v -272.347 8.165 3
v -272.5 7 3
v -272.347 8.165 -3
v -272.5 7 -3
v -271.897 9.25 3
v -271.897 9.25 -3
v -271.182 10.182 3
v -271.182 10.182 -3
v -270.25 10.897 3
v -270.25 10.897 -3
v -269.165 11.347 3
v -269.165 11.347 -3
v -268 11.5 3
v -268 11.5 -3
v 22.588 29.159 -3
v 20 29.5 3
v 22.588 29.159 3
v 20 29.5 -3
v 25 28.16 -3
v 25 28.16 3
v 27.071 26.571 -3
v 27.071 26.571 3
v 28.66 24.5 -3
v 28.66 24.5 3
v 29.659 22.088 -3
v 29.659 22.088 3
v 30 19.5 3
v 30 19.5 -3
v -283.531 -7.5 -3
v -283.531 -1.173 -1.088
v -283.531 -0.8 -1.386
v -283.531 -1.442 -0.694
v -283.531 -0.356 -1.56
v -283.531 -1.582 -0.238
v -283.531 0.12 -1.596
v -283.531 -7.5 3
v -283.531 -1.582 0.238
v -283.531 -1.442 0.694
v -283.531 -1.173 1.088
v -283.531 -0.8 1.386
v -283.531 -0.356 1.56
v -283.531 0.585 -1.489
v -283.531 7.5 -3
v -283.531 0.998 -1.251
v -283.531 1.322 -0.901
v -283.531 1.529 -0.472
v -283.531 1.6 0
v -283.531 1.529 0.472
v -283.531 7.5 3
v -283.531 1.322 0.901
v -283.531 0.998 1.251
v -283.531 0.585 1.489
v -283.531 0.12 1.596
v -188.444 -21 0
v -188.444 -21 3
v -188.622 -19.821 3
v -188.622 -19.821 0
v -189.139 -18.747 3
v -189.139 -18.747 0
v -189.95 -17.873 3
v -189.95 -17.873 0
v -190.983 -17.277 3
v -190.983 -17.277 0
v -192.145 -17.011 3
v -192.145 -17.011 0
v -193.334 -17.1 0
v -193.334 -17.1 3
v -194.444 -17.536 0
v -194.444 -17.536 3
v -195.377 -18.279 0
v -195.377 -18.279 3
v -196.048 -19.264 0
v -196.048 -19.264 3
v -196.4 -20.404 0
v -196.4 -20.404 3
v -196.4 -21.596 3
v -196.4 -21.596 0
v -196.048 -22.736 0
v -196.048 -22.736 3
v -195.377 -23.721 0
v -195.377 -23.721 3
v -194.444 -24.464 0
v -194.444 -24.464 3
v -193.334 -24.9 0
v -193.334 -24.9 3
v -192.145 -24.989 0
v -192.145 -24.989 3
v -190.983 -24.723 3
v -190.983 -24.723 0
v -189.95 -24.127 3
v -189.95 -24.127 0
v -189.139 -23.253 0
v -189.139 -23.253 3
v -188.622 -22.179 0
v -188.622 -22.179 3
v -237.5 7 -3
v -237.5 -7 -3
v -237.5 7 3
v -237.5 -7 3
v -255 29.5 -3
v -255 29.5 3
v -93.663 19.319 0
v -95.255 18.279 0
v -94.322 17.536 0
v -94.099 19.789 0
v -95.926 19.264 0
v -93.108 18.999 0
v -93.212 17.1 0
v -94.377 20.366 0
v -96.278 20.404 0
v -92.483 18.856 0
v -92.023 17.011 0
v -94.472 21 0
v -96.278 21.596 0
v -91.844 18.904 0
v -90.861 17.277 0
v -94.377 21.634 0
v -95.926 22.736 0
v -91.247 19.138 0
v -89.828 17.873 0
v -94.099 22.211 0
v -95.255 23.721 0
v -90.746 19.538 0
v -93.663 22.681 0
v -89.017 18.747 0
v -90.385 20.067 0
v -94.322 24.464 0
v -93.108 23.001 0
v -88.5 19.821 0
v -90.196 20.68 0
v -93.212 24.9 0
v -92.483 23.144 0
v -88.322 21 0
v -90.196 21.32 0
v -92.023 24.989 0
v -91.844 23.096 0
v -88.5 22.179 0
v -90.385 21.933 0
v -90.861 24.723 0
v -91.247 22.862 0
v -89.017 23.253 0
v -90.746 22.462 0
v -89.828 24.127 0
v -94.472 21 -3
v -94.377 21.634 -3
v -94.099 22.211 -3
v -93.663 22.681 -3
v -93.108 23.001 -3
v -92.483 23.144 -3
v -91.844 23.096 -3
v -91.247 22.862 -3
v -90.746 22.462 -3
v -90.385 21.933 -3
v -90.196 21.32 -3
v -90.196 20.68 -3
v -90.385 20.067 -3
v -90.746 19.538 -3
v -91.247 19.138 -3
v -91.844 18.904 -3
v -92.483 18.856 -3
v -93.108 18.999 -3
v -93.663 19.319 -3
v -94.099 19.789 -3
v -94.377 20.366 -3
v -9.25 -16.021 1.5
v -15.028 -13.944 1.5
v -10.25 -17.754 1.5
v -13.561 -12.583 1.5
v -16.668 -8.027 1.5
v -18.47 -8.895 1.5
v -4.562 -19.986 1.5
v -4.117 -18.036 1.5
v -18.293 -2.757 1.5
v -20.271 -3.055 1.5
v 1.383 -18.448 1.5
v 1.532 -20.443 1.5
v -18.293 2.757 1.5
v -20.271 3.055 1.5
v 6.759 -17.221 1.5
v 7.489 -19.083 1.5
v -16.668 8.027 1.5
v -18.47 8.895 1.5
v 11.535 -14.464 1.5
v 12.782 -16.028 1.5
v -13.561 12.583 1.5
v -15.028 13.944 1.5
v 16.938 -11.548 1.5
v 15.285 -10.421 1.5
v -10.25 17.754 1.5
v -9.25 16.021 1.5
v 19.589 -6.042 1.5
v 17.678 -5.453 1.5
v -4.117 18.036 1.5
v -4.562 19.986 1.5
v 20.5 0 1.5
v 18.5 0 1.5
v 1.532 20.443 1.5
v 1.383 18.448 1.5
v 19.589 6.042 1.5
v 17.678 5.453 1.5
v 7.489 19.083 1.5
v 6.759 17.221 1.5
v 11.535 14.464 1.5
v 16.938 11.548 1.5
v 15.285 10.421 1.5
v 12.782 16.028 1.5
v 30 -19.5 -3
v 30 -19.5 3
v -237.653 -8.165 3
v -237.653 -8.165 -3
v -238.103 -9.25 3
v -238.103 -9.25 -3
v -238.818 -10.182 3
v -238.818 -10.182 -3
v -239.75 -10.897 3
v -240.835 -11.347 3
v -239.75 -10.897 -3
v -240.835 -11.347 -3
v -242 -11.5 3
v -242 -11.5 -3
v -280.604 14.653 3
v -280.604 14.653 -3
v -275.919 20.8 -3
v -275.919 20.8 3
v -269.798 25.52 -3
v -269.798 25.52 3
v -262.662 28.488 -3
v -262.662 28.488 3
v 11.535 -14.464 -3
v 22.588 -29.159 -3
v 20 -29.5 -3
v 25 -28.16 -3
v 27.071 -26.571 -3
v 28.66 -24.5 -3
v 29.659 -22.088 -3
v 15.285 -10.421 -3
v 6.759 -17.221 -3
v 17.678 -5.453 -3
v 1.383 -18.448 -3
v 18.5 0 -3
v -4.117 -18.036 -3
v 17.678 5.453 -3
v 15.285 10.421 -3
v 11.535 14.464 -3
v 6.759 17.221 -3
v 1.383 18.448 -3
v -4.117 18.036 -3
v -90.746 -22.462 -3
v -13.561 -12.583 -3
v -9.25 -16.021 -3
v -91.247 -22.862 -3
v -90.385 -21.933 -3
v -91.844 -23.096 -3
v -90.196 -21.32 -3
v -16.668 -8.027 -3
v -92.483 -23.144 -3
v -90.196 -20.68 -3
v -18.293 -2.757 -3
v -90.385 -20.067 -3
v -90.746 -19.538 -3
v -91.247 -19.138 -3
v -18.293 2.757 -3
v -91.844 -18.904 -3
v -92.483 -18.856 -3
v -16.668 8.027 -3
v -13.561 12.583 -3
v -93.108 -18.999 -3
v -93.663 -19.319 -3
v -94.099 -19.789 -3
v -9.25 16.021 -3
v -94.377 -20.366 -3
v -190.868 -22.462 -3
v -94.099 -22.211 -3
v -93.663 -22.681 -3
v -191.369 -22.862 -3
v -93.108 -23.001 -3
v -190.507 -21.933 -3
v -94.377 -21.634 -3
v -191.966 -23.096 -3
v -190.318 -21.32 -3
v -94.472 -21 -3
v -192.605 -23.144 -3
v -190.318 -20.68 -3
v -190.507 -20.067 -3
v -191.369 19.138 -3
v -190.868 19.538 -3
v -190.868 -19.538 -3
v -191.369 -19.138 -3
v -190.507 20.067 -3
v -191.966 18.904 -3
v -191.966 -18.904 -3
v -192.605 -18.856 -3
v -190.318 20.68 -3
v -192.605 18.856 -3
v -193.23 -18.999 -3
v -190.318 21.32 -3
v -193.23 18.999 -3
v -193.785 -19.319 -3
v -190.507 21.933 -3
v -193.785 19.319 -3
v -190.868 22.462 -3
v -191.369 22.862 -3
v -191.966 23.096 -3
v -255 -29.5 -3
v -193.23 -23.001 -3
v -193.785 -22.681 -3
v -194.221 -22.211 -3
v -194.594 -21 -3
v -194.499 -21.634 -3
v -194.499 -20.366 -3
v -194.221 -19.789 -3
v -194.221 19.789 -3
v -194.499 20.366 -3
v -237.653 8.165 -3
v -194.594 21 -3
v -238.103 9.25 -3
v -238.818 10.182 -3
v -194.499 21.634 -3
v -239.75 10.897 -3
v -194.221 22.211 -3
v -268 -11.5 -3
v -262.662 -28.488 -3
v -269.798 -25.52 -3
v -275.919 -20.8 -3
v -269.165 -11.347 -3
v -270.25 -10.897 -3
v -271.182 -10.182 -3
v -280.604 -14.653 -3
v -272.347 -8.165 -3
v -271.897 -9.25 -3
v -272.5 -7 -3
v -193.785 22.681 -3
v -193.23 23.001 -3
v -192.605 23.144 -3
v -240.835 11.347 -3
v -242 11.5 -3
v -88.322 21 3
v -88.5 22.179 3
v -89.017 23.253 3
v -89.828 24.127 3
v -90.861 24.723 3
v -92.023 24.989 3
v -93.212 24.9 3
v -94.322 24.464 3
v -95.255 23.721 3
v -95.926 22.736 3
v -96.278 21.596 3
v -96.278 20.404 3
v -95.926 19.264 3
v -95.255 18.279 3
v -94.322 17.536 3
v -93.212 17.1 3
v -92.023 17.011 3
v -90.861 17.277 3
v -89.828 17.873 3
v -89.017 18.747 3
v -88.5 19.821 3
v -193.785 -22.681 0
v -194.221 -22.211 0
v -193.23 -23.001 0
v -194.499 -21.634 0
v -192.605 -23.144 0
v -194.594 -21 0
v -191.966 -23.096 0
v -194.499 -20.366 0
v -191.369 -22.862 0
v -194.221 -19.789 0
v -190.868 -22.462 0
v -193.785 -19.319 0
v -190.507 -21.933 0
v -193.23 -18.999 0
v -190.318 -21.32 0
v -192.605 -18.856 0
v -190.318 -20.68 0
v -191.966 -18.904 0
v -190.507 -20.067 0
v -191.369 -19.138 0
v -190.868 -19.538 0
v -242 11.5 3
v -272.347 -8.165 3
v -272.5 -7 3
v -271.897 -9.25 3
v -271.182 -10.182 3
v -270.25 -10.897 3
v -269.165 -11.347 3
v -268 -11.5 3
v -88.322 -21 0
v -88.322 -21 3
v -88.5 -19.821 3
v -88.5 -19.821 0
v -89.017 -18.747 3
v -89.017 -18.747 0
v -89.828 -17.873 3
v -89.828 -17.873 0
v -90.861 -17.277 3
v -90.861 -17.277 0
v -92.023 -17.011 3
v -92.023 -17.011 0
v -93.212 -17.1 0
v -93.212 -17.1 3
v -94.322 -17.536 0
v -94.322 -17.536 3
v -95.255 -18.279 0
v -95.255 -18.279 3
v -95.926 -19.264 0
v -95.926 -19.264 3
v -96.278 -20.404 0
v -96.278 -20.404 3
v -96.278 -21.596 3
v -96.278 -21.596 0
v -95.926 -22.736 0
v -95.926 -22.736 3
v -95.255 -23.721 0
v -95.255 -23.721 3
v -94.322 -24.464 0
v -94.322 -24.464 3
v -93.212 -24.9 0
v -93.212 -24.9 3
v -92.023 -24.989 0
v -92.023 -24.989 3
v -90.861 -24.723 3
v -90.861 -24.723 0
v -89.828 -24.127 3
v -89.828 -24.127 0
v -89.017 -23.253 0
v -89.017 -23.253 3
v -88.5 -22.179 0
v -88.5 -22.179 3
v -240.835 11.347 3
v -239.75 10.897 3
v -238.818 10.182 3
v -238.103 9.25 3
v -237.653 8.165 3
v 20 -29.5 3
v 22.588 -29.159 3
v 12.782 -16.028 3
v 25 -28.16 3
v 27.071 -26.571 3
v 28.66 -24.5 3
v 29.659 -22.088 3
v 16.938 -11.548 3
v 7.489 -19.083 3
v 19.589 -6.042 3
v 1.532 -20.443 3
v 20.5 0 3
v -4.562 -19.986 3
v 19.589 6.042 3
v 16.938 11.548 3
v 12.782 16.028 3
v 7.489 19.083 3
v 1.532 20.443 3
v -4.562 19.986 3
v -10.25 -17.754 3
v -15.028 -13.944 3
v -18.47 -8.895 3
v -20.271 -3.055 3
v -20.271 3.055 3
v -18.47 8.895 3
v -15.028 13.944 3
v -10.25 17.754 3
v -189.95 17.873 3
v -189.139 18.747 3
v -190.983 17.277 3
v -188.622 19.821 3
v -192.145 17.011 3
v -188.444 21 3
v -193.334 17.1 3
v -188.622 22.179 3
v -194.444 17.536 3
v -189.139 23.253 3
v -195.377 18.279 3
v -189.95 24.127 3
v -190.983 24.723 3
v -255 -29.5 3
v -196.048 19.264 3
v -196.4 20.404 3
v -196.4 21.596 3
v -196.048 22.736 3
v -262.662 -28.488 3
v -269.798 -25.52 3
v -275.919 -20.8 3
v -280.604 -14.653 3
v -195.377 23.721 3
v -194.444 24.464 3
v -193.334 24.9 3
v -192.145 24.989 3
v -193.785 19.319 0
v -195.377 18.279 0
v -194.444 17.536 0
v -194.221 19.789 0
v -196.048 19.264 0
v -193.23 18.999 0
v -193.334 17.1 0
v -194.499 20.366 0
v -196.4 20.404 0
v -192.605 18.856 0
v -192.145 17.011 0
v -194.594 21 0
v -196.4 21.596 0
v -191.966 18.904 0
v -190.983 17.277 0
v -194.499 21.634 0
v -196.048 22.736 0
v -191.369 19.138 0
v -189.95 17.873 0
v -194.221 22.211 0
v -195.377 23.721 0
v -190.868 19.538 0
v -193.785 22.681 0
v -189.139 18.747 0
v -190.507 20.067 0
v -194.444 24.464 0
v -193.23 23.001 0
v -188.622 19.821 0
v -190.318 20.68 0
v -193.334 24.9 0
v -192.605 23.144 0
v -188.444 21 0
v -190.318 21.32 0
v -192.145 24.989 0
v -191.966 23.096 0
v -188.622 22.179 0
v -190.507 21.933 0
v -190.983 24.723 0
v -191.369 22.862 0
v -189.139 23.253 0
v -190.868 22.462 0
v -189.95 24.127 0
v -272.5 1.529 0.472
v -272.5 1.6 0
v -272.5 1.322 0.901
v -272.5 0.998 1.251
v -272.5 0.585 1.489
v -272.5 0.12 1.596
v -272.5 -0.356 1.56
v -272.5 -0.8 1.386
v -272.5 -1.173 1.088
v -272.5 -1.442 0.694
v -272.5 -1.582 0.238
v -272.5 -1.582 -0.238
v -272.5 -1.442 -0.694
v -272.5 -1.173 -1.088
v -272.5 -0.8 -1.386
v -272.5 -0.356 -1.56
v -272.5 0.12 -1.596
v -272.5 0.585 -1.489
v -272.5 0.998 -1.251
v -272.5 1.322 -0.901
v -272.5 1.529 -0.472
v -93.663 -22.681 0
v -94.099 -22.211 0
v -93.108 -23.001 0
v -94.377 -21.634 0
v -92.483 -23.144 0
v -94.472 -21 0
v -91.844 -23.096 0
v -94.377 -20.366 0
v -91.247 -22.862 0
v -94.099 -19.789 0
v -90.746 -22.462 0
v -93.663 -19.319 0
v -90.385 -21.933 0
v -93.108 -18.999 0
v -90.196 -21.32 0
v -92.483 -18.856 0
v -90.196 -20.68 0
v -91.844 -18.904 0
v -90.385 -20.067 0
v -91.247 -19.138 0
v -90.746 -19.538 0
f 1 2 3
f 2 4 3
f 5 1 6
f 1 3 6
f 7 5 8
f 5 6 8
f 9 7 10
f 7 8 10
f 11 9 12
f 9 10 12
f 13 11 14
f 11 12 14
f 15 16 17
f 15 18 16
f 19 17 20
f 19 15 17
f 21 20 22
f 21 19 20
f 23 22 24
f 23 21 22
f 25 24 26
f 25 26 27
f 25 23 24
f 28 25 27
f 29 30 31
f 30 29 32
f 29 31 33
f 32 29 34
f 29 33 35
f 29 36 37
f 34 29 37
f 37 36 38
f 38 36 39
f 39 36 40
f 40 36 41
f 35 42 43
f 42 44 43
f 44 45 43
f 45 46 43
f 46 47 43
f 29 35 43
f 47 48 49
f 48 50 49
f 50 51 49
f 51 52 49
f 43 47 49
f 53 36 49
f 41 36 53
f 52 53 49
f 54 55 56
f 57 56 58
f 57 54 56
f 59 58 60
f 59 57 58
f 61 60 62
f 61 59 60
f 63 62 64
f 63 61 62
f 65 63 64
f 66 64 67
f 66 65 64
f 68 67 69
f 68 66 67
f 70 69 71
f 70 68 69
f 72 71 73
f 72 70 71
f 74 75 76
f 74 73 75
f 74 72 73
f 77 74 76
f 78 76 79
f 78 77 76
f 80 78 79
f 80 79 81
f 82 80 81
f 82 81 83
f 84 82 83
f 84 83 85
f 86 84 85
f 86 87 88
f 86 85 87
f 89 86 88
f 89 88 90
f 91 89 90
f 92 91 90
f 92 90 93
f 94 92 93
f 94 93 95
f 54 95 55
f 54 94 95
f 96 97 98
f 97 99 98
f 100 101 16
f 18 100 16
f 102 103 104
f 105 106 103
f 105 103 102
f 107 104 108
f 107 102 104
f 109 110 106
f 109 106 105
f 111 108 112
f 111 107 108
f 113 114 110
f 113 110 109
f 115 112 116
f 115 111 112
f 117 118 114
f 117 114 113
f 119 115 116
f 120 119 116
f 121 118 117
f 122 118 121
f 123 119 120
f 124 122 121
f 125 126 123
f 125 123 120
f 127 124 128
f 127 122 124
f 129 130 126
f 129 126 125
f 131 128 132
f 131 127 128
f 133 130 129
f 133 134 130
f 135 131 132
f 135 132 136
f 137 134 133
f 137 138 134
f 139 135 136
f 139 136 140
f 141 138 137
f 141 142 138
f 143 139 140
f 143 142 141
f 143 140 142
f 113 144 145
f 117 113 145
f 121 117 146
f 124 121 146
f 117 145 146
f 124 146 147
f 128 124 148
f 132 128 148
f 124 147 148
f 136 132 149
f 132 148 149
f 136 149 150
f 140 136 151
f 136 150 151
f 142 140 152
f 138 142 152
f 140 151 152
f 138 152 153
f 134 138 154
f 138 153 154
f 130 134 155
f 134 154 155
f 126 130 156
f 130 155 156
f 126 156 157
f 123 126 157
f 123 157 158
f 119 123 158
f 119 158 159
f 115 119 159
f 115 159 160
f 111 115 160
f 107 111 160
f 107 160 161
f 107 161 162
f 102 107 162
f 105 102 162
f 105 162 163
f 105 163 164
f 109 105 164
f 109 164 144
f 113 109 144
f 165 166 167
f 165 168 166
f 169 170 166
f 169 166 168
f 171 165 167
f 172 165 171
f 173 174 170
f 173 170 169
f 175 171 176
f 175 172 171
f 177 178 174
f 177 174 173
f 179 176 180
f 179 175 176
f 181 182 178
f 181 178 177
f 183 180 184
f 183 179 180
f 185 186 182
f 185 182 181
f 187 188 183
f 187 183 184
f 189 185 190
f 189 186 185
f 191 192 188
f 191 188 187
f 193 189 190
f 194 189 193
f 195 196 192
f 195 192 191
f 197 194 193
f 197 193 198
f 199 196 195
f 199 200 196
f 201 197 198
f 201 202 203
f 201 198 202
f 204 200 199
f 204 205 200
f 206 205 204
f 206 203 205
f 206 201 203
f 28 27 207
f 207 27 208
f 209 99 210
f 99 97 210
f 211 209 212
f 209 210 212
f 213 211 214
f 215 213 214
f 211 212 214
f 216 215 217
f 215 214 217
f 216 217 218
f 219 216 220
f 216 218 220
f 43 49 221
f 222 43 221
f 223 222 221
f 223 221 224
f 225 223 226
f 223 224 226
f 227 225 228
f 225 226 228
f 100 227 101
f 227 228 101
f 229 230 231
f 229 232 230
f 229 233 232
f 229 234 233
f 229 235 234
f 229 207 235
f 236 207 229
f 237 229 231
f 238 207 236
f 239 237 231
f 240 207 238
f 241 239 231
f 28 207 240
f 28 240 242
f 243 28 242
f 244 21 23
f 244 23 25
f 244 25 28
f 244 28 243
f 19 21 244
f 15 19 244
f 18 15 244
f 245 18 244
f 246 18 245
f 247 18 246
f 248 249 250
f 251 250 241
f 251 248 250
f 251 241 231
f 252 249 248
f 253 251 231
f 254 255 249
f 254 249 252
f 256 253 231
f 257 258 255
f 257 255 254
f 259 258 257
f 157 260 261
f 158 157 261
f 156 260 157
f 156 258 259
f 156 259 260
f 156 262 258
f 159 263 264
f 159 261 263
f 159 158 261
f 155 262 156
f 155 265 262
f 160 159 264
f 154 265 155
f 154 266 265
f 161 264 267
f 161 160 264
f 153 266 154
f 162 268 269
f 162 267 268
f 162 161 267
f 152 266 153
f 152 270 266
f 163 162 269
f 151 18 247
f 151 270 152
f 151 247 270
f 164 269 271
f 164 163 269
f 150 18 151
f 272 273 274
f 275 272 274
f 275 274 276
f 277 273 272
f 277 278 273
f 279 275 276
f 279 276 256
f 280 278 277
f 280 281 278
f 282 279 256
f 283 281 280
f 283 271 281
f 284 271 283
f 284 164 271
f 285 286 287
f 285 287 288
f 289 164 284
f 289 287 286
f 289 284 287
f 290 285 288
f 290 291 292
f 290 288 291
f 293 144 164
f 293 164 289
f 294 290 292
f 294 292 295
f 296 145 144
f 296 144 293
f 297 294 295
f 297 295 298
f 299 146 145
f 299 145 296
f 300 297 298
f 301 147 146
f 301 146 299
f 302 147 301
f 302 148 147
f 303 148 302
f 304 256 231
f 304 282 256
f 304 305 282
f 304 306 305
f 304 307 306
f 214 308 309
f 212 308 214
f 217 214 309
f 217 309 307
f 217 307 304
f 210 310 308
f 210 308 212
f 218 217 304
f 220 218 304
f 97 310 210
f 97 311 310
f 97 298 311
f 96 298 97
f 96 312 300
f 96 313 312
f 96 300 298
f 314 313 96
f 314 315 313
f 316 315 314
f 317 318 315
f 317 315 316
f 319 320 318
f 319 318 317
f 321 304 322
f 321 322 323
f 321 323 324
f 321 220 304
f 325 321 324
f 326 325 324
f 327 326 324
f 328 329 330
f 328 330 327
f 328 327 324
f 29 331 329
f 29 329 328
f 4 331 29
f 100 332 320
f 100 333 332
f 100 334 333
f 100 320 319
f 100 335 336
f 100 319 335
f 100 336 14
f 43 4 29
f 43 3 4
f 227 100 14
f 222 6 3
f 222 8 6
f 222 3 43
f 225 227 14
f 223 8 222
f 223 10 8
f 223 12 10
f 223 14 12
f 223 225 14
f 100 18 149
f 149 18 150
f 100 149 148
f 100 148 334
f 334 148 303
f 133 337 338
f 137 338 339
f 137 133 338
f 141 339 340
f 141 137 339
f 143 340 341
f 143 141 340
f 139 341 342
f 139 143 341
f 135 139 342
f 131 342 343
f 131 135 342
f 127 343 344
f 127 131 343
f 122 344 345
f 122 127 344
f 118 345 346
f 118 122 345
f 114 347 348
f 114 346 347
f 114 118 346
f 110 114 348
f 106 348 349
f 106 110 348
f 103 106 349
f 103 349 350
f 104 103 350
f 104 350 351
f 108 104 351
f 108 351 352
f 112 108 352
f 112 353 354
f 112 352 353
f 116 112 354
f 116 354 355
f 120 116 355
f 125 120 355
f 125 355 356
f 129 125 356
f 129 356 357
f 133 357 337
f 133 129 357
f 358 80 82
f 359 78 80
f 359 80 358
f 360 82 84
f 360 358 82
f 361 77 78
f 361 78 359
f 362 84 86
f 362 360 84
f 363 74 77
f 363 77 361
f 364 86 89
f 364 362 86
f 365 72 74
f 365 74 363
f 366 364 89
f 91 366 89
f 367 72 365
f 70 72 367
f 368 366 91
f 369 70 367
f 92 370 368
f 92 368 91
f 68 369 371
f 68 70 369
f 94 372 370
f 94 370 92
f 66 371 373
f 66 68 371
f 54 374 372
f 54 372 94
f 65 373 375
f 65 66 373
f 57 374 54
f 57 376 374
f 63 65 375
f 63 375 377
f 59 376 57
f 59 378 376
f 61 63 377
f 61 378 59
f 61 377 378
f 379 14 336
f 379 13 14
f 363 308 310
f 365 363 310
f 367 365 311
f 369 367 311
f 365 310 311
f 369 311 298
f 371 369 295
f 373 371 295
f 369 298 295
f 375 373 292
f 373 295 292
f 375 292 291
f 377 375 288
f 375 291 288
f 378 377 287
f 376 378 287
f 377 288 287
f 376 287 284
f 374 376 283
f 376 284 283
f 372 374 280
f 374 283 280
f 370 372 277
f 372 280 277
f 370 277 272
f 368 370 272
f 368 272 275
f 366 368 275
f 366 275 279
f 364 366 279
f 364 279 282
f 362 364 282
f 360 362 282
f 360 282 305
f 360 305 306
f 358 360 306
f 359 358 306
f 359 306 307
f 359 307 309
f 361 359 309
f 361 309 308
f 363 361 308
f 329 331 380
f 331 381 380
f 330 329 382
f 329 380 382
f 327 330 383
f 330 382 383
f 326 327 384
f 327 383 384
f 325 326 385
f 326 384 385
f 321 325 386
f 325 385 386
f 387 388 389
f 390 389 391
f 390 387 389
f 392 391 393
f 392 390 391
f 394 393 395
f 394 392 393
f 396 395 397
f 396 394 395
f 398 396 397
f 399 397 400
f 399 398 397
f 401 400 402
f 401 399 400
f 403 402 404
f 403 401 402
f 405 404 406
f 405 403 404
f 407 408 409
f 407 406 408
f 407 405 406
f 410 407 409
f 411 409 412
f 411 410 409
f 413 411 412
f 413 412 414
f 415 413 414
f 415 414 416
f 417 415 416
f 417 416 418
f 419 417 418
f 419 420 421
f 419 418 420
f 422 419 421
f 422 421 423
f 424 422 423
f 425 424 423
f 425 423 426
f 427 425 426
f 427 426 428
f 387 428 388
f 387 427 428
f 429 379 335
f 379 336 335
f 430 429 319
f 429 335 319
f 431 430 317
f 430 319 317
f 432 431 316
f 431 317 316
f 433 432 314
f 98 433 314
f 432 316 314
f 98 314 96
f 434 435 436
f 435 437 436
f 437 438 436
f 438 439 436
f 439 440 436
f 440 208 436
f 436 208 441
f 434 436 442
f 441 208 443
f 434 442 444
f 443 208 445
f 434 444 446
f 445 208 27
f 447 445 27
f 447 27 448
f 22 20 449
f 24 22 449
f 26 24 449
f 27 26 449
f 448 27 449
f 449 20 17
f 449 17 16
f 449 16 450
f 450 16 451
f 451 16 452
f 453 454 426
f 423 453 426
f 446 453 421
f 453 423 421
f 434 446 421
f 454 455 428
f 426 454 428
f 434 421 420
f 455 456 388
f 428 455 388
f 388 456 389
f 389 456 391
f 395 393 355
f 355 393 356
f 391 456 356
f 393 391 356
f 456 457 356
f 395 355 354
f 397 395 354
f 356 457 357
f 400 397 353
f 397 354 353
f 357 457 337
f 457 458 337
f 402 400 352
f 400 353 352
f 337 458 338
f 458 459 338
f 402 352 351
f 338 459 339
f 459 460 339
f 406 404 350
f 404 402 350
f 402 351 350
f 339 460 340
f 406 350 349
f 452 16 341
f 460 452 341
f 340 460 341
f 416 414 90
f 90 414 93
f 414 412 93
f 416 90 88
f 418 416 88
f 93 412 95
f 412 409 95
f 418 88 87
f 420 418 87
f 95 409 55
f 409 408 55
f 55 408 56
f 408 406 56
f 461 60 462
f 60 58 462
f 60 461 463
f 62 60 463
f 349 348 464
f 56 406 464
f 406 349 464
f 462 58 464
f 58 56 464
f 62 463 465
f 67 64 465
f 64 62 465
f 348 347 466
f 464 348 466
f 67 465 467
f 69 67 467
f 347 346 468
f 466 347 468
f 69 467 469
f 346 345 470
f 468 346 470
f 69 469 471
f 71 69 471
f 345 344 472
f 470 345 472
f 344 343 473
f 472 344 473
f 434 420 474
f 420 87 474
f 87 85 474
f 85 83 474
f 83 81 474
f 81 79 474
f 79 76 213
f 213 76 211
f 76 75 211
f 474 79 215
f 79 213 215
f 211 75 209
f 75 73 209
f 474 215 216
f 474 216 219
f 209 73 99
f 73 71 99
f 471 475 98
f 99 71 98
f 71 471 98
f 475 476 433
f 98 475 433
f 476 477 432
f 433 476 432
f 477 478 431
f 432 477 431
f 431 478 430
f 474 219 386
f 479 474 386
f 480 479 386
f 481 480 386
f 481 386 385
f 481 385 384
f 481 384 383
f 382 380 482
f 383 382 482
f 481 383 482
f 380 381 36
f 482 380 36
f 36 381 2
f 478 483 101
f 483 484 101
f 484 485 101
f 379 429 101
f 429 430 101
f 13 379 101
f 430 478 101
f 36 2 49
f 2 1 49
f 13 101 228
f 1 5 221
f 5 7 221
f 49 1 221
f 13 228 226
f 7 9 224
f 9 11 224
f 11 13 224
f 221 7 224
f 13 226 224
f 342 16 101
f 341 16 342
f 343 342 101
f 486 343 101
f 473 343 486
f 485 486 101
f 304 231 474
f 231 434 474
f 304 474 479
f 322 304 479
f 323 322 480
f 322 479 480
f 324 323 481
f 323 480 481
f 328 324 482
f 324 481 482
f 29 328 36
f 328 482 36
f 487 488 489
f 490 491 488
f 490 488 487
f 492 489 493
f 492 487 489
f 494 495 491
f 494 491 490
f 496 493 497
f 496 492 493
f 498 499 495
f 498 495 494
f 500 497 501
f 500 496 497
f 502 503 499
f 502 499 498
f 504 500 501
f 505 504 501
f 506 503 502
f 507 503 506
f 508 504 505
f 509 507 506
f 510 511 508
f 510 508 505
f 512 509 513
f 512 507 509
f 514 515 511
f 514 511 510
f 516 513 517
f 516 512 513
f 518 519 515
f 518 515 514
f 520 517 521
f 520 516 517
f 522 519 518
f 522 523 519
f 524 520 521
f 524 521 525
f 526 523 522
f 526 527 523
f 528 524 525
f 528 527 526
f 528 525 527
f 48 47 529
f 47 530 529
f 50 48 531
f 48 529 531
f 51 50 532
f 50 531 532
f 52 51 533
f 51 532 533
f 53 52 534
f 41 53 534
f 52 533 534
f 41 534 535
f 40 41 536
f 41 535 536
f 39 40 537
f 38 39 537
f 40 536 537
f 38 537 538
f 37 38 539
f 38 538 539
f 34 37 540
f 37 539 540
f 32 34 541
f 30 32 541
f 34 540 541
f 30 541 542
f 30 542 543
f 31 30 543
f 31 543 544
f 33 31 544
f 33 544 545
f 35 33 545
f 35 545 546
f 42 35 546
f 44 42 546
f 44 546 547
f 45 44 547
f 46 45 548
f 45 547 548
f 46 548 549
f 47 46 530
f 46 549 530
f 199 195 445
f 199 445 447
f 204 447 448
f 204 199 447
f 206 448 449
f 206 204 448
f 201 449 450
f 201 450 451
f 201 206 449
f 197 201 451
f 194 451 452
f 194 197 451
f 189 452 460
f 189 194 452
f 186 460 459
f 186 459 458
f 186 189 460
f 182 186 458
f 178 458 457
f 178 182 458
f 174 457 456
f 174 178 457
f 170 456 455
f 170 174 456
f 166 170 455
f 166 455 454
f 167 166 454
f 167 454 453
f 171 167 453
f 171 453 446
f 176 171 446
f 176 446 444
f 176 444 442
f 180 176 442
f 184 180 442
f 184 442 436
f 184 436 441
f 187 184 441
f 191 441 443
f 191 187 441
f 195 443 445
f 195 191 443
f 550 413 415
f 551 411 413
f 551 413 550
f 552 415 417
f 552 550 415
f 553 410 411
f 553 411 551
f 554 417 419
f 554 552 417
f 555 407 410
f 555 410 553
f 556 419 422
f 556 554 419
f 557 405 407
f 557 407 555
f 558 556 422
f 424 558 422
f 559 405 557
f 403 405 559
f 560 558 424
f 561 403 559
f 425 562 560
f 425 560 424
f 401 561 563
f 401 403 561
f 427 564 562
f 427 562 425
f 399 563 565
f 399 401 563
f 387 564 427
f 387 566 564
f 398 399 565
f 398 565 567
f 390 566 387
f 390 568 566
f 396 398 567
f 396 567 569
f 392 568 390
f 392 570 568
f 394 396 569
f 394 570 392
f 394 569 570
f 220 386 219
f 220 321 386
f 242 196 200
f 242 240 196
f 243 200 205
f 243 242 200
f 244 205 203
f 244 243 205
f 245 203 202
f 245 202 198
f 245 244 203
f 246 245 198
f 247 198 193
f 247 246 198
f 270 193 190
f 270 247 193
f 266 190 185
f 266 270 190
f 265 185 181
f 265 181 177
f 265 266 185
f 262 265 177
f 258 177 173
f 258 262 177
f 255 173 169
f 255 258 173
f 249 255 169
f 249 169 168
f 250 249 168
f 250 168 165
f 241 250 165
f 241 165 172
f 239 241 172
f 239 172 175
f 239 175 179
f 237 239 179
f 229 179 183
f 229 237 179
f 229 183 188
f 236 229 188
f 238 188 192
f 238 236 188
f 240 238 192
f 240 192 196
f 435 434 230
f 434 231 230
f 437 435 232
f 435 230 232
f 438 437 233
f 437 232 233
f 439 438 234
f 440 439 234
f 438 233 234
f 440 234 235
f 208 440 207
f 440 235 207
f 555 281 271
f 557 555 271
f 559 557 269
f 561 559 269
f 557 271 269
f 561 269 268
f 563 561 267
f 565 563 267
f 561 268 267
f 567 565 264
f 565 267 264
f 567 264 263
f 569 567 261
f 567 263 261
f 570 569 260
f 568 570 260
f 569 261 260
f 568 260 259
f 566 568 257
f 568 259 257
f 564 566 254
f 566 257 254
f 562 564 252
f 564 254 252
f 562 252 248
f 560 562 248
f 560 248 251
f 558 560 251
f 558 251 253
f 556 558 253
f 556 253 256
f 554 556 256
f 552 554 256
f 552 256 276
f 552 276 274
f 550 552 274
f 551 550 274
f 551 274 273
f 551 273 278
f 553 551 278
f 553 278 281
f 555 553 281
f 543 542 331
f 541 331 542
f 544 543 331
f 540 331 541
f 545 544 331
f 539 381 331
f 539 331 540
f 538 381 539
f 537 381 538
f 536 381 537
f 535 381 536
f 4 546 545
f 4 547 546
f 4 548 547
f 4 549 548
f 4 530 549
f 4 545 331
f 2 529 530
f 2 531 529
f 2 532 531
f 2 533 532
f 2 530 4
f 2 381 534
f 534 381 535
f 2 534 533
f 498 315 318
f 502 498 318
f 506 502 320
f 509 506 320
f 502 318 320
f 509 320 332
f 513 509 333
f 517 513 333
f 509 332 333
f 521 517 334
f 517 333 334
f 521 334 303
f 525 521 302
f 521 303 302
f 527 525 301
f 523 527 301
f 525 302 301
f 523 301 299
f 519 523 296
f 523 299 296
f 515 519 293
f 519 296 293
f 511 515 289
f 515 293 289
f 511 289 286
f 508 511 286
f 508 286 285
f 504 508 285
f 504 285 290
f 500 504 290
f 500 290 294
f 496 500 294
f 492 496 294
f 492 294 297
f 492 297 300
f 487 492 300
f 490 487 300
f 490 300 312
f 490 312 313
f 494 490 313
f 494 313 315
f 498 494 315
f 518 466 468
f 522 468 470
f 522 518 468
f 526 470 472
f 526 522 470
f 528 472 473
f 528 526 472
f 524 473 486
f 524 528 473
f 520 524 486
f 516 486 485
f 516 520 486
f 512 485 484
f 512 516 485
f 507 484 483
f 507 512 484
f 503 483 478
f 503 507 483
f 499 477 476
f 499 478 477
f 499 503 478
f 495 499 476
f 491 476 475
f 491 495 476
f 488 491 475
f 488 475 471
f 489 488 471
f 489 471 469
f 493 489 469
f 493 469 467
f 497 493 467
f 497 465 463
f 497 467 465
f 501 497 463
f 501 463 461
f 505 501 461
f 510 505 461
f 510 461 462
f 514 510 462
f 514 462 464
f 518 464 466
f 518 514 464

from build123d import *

# Parameters (mm, degrees)
SKETCH_1_R             = 18.5
SKETCH_1_W             = 35
SKETCH_1_H             = 23
EXTRUDE_1_DEPTH        = 3
CUT_EXTRUDE_START      = 1.5
SKETCH_1_3_R           = 20.5
SKETCH_1_3_R_2         = 18.5
CUT_EXTRUDE_1_DEPTH    = 1.5
FILLET_1_R             = 4.5
HOLE_WIZARD_M3_2_D     = 3.2
HOLE_WIZARD_M3_2_DEPTH = 12
HOLE_WIZARD_M4_1_D     = 4.3
SKETCH_1_4_R           = 4
CUT_EXTRUDE_2_DEPTH    = 287.041081094
EXTRUDE_2_DEPTH        = 6
FILLET_2_R             = 10
SKETCH_7_W             = 5
SKETCH_7_H             = 15
CUT_EXTRUDE_3_DEPTH    = 6


with BuildPart() as part:
    # ｽｹｯﾁ1 → ﾎﾞｽ - 押し出し1 (new, symmetric)
    with BuildSketch(Plane.XY):
        with BuildLine():
            Line((0, -29.5), (-255, -29.5))
            ThreePointArc((-255, -29.5), (-284.5, 0), (-255, 29.5))
            Line((-255, 29.5), (0, 29.5))
            ThreePointArc((0, 29.5), (29.5, 0), (0, -29.5))
        make_face()
        Circle(SKETCH_1_R, mode=Mode.SUBTRACT)
        with Locations((-255, 0)):
            Rectangle(SKETCH_1_W, SKETCH_1_H, mode=Mode.SUBTRACT)
    extrude(amount=EXTRUDE_1_DEPTH, both=True)

    # ｽｹｯﾁ1<3> → ｶｯﾄ - 押し出し1 (cut)
    with BuildSketch(Plane.XY.offset(CUT_EXTRUDE_START)):
        Circle(SKETCH_1_3_R)
        Circle(SKETCH_1_3_R_2, mode=Mode.SUBTRACT)
    extrude(amount=CUT_EXTRUDE_1_DEPTH, mode=Mode.SUBTRACT)

    # ﾌｨﾚｯﾄ1
    fillet_1_edges = [part.edges().sort_by_distance(p)[0] for p in [
        (-272.5, 11.5, 0),
        (-272.5, -11.5, 0),
        (-237.5, -11.5, 0),
        (-237.5, 11.5, 0),
    ]]
    fillet(fillet_1_edges, radius=FILLET_1_R)

    # M3 すきま穴2
    with Locations(Plane(origin=(-284.5, 0, 0), x_dir=(0, -1, 0), z_dir=(-1, 0, 0))):
        with Locations((0, 0)):
            Hole(HOLE_WIZARD_M3_2_D / 2, depth=HOLE_WIZARD_M3_2_DEPTH)

    # Hole Wizard M4 _1 (through all)
    with Locations(Plane(origin=(-192.444390405, 21, 3), x_dir=(1, 0, 0), z_dir=(0, 0, 1))):
        with Locations((0, 0), (100.122073915, 0), (100.122073915, -42), (0, -42)):
            Hole(HOLE_WIZARD_M4_1_D / 2)

    # ｽｹｯﾁ1<4> → ｶｯﾄ - 押し出し2 (cut, through all)
    with BuildSketch(Plane.XY):
        with Locations((-192.444390405, -21)):
            Circle(SKETCH_1_4_R)
        with Locations((-192.444390405, 21)):
            Circle(SKETCH_1_4_R)
        with Locations((-92.32231649, 21)):
            Circle(SKETCH_1_4_R)
        with Locations((-92.32231649, -21)):
            Circle(SKETCH_1_4_R)
    extrude(amount=CUT_EXTRUDE_2_DEPTH, mode=Mode.SUBTRACT)

    # ｽｹｯﾁ6 → ﾎﾞｽ - 押し出し2 (add)
    with BuildSketch(Plane.XY.offset(3)):
        with BuildLine():
            Line((0, 29.5), (30, 29.5))
            Line((30, 29.5), (30, -29.5))
            Line((30, -29.5), (0, -29.5))
            ThreePointArc((0, -29.5), (29.5, 0), (0, 29.5))
        make_face()
    extrude(amount=-EXTRUDE_2_DEPTH)

    # ﾌｨﾚｯﾄ2
    fillet_2_edges = [part.edges().sort_by_distance(p)[0] for p in [
        (30, 29.5, 0),
        (30, -29.5, 0),
    ]]
    fillet(fillet_2_edges, radius=FILLET_2_R)

    # ｽｹｯﾁ7 → ｶｯﾄ - 押し出し3 (cut)
    with BuildSketch(Plane.XY.offset(3)):
        with Locations((-286.030685235, 0)):
            Rectangle(SKETCH_7_W, SKETCH_7_H)
    extrude(amount=-CUT_EXTRUDE_3_DEPTH, mode=Mode.SUBTRACT)


solid = part.part
